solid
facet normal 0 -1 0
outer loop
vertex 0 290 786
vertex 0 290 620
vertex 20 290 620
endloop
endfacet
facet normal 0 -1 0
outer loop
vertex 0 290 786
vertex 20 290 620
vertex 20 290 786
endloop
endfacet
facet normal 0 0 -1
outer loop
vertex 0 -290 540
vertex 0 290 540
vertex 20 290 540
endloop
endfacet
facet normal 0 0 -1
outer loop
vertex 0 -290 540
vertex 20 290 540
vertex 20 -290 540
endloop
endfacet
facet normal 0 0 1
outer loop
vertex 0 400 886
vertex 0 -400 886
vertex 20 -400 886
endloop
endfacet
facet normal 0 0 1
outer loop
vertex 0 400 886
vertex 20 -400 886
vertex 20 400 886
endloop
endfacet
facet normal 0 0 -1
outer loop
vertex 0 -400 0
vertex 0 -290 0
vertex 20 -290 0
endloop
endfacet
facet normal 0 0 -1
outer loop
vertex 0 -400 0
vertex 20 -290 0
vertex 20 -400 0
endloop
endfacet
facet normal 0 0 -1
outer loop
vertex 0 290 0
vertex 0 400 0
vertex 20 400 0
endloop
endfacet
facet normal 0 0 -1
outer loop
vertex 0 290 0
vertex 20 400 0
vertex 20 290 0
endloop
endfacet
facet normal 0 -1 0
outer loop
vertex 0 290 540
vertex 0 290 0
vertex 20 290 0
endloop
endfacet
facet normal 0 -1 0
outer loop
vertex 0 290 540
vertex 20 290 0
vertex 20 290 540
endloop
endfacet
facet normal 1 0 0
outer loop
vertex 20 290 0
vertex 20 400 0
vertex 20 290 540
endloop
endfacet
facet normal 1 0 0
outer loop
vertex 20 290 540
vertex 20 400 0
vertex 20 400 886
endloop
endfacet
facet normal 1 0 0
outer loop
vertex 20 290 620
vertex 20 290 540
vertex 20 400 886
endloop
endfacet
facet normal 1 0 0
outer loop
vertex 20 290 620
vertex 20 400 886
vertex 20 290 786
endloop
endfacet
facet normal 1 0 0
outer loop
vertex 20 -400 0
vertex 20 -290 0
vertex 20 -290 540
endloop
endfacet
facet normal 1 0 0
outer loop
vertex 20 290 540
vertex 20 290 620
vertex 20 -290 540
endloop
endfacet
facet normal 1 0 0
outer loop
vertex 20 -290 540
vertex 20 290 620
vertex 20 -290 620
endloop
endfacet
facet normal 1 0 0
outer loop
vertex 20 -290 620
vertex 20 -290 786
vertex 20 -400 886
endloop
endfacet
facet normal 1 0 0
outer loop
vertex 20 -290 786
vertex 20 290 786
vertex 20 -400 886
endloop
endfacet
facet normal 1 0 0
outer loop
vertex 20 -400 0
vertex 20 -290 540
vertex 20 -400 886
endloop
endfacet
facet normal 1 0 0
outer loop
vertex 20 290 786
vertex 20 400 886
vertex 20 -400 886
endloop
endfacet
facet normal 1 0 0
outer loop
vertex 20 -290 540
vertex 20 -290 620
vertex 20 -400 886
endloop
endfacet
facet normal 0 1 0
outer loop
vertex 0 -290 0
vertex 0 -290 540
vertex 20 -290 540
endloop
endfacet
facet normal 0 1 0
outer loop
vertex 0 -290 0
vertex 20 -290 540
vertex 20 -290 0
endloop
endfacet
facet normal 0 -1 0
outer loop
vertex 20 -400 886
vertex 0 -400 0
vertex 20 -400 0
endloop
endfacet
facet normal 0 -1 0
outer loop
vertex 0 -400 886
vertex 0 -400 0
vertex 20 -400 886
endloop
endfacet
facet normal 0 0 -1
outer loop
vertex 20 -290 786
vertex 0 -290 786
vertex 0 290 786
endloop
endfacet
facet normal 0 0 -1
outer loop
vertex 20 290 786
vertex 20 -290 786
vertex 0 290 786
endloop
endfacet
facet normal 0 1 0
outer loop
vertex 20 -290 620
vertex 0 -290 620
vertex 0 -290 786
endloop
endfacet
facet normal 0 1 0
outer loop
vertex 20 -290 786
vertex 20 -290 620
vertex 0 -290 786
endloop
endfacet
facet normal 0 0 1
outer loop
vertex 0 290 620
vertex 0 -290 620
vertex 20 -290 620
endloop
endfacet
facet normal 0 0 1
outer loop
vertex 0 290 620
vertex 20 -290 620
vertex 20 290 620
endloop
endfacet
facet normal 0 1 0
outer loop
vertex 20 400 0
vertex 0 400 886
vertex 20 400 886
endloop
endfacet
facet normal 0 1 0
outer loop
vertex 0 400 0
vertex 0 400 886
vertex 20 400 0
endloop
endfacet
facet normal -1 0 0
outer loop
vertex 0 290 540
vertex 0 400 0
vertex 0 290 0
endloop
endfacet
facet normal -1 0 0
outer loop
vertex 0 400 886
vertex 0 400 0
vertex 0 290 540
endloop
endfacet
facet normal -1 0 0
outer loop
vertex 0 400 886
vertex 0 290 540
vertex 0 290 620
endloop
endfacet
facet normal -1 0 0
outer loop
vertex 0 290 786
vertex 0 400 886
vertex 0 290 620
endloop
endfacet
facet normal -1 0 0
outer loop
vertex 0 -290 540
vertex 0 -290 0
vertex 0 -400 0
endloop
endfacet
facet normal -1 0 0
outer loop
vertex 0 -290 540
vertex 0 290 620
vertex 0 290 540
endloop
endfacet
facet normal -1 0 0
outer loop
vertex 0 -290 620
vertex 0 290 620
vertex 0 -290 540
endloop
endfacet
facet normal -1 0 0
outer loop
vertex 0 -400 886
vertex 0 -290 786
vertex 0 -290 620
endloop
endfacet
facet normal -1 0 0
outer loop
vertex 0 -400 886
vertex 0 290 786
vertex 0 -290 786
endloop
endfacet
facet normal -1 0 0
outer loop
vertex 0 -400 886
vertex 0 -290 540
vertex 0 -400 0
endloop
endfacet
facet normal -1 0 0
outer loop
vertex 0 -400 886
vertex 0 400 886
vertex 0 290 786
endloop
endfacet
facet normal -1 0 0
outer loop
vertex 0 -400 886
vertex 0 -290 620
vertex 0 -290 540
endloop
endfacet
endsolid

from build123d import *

# Parameters (mm, degrees)
SKETCH_W  = 580
SKETCH_H  = 166
PAD_DEPTH = 20


with BuildPart() as part:
    # Sketch → Pad (new body)
    with BuildSketch(Plane.YZ):
        Polygon((-290, 0), (-400, 0), (-400, 886), (400, 886), (400, 0), (290, 0), (290, 540), (-290, 540), align=None)
        with Locations((0, 703)):
            Rectangle(SKETCH_W, SKETCH_H, mode=Mode.SUBTRACT)
    extrude(amount=PAD_DEPTH)


solid = part.part
